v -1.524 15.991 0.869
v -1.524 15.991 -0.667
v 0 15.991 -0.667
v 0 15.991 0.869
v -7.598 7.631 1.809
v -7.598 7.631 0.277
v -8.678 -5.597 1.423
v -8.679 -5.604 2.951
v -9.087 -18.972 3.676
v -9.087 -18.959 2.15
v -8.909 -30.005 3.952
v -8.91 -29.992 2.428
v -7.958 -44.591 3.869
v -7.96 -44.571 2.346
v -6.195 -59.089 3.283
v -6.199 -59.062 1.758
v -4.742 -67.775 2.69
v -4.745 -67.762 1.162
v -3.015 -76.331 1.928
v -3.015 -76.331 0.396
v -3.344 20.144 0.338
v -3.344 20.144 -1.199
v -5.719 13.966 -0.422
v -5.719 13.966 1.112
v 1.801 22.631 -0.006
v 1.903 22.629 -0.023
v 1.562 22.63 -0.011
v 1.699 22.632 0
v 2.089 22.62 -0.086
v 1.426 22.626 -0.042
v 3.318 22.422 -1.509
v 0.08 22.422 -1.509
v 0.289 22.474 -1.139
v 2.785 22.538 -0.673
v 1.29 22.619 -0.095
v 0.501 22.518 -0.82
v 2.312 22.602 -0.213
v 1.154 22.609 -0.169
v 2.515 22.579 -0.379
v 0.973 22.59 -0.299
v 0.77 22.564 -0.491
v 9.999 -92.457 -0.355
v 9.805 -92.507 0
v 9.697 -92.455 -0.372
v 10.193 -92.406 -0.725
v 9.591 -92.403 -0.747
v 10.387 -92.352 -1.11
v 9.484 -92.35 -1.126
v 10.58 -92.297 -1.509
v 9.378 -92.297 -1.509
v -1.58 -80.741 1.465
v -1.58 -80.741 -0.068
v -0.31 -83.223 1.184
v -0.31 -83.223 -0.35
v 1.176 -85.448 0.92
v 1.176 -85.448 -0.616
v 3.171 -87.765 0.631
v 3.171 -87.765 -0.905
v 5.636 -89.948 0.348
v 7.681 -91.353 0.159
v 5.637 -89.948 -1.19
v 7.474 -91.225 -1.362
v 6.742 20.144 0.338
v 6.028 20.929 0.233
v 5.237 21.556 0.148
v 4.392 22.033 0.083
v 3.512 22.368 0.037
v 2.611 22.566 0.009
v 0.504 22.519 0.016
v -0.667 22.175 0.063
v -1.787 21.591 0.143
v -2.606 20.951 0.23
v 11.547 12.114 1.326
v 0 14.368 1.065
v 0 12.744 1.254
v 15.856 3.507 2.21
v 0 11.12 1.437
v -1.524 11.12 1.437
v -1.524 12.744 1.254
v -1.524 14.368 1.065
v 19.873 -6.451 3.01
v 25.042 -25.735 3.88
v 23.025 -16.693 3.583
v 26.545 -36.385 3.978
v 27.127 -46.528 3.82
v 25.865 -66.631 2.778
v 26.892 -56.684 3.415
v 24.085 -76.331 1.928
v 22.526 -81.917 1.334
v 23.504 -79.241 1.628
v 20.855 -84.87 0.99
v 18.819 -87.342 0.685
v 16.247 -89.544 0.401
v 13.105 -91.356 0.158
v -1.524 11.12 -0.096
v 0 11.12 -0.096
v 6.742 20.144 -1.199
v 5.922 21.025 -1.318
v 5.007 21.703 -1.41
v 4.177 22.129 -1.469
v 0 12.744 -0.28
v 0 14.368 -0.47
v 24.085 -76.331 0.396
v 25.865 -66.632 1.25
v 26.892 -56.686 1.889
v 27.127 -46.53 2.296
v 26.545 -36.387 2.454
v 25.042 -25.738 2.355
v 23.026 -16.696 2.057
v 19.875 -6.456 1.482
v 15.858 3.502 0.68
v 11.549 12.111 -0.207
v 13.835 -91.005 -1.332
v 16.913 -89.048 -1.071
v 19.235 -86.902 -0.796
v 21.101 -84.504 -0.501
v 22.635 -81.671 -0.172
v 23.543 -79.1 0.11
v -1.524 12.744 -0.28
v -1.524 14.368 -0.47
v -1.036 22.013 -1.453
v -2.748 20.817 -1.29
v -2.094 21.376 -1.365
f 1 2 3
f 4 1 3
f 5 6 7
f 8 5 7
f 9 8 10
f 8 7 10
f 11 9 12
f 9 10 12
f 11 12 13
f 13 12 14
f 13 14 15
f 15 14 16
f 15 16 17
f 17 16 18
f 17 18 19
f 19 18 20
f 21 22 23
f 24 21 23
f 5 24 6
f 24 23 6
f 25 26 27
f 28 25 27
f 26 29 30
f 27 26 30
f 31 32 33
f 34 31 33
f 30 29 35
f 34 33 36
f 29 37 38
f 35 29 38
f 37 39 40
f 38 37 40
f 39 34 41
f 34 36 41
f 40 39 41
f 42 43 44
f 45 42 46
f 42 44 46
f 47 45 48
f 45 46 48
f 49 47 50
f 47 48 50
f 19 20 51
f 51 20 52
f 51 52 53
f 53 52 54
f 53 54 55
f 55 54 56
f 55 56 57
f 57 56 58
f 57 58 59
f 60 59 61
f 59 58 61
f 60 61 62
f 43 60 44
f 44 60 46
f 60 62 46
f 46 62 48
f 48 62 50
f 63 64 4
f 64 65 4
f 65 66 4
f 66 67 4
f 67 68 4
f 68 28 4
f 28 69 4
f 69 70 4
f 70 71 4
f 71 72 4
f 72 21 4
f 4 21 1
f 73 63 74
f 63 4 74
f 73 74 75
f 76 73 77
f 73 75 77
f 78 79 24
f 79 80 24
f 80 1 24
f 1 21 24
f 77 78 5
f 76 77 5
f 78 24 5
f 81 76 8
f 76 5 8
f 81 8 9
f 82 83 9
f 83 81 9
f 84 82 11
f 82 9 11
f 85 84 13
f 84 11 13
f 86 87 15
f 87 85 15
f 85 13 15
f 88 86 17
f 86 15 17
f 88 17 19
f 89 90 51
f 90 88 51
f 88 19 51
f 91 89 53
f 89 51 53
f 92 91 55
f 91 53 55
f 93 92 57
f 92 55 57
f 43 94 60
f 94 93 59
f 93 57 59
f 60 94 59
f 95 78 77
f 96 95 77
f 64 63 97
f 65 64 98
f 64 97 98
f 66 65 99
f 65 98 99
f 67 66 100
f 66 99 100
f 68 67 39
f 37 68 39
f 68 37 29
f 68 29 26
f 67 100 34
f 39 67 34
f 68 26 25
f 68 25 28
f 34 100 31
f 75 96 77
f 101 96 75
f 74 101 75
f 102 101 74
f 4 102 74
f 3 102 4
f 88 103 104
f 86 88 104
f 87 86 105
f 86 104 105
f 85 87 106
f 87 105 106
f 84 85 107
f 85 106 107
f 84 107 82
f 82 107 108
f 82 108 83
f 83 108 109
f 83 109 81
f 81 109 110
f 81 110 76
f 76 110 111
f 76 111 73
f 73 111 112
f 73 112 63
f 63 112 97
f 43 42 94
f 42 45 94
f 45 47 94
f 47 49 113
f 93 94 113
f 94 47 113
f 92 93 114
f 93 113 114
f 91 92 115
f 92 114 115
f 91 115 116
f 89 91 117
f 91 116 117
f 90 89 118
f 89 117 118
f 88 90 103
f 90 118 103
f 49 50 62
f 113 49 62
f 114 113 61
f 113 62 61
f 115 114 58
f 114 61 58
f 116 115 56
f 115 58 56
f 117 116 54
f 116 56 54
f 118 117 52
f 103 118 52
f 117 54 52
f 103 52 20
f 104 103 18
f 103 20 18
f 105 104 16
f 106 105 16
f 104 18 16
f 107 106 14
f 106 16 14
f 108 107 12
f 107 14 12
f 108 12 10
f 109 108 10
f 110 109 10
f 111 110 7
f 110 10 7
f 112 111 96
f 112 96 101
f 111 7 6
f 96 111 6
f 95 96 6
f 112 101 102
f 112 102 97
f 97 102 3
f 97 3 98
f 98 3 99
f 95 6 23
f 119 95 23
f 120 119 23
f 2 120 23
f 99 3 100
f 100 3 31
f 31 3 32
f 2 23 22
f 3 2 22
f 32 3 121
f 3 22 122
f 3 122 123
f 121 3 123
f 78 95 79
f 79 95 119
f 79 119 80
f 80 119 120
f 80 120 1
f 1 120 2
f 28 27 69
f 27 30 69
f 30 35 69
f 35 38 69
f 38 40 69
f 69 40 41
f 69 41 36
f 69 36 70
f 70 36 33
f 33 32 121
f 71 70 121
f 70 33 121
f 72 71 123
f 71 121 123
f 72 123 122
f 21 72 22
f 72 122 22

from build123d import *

# Parameters (mm, degrees)
BOSS_EXTRUDE1_DEPTH      = 50.8
BOSS_EXTRUDE1_DEPTH_BACK = 50.8
SKETCH1_W                = 1.524
SKETCH1_H                = 4.871067054
CUT_EXTRUDE1_DEPTH       = 50.8
CUT_EXTRUDE1_DEPTH_BACK  = 50.8
SKETCH2_OUTSIDE_W        = 135.154
SKETCH2_OUTSIDE_H        = 148.693


with BuildPart() as part:
    # Sketch1 → Boss-Extrude1 (new, two sides: drawn at the far end of the back side and taken through both)
    with BuildSketch(Plane.XY.offset(-BOSS_EXTRUDE1_DEPTH_BACK)):
        with BuildLine():
            ThreePointArc((6.741617203, 20.144109787), (1.698900198, 22.631956132), (-3.343816807, 20.144109787))
            ThreePointArc((-3.343816807, 20.144109787), (-5.71730664, 13.971140244), (-7.597975628, 7.630628347))
            ThreePointArc((-7.597975628, 7.630628347), (-8.701431417, -34.535652594), (-3.014754354, -76.331281159))
            ThreePointArc((-3.014754354, -76.331281159), (1.525815948, -85.900303593), (9.804659046, -92.506643425))
            ThreePointArc((9.804659046, -92.506643425), (19.466075818, -86.644924226), (24.084678714, -76.331281159))
            ThreePointArc((24.084678714, -76.331281159), (25.152625845, -26.342752003), (6.741617203, 20.144109787))
        make_face()
        with Locations((-0.762, 13.555168851)):
            Rectangle(SKETCH1_W, SKETCH1_H, mode=Mode.SUBTRACT)
    extrude(amount=BOSS_EXTRUDE1_DEPTH + BOSS_EXTRUDE1_DEPTH_BACK)

    # Sketch2 outside → Cut-Extrude1 (cut, two sides: drawn at the far end of the back side and taken through both)
    with BuildSketch(Plane(origin=(0, 0, 0), x_dir=(0, 0, -1), z_dir=(1, 0, 0)).offset(-CUT_EXTRUDE1_DEPTH_BACK)):
        with Locations((0, -34.9375)):
            Rectangle(SKETCH2_OUTSIDE_W, SKETCH2_OUTSIDE_H)
        with BuildLine():
            Line((1.509494799, 22.422190899), (0, 22.631956132))
            ThreePointArc((0, 22.631956132), (-3.980899399, -34.937343647), (0, -92.506643425))
            Line((0, -92.506643425), (1.509494799, -92.296878192))
            ThreePointArc((1.509494799, -92.296878192), (-2.456899399, -34.937343647), (1.509494799, 22.422190899))
        make_face(mode=Mode.SUBTRACT)
    extrude(amount=CUT_EXTRUDE1_DEPTH + CUT_EXTRUDE1_DEPTH_BACK, mode=Mode.SUBTRACT)


solid = part.part
